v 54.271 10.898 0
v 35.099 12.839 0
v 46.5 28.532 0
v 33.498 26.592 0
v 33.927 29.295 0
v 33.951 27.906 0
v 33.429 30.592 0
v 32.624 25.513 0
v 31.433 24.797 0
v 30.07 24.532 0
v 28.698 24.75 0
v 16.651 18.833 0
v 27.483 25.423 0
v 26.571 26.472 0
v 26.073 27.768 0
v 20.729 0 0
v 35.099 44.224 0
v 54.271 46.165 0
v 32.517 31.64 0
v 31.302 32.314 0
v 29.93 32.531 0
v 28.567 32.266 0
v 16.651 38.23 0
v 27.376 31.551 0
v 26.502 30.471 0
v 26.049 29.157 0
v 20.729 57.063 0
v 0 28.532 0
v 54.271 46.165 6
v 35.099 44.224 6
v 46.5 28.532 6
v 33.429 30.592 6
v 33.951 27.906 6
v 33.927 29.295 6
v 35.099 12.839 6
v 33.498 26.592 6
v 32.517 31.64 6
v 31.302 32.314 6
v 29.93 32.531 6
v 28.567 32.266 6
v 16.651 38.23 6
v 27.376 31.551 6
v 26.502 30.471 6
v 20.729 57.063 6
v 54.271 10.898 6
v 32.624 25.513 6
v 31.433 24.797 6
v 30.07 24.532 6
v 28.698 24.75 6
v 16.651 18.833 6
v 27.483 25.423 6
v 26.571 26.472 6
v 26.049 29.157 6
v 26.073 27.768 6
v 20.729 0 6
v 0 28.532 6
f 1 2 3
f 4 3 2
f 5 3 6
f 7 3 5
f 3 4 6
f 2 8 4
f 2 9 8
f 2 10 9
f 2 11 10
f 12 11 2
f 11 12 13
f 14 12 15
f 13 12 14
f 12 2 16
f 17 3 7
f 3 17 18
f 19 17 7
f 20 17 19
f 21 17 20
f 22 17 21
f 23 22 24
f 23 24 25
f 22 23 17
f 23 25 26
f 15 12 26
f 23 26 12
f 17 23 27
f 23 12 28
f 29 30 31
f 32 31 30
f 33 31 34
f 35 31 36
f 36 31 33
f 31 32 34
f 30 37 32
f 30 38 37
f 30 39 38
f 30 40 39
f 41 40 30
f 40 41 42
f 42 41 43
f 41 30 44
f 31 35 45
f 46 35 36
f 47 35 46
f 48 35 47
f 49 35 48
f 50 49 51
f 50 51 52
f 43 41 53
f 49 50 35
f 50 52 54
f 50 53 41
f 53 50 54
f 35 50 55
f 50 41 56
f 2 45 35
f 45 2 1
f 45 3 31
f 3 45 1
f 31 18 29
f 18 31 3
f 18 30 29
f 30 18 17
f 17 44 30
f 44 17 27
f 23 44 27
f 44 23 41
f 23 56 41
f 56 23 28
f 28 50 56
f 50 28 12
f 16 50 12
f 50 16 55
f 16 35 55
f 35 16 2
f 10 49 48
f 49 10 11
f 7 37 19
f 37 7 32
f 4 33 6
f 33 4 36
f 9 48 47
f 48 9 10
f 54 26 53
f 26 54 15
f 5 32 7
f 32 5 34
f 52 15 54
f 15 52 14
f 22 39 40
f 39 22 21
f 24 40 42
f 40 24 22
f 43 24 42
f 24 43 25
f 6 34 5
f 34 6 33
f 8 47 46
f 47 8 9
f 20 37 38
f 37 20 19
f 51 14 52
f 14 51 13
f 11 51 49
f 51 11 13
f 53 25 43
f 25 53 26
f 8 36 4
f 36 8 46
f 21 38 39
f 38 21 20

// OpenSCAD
$fn = 32;

// ----------------------------------------------------------------------
// Star wheel: 5-point star, R30
// ----------------------------------------------------------------------

// --- parameters (mm) ---
n_points = 5;             // number of points / teeth
r_out = 30;               // tip radius
r_in = 16.5;              // root radius
bore_r = 4;               // centre bore radius
plate_t = 6;              // plate thickness, Z (extrusion height)
bore_d = 8;               // centre bore diameter

profile = [[0, 28.532], [16.651, 18.833], [20.729, 0], [35.099, 12.839], [54.271, 10.898], [46.5, 28.532], [54.271, 46.165], [35.099, 44.224], [20.729, 57.063], [16.651, 38.23]];  // primary outline, 10 points, counter clockwise
void_1 = [[33.927, 29.295], [33.429, 30.592], [32.517, 31.64], [31.302, 32.314], [29.93, 32.531], [28.567, 32.266], [27.376, 31.551], [26.502, 30.471], [26.049, 29.157], [26.073, 27.768], [26.571, 26.472], [27.483, 25.423], [28.698, 24.75], [30.07, 24.532], [31.433, 24.797], [32.624, 25.513], [33.498, 26.592], [33.951, 27.906]];  // centre bore, 18 points

// --- the one profile operation ---
difference() {
  linear_extrude(height = plate_t) polygon(points = profile);
  translate([0, 0, -1])
    linear_extrude(height = plate_t + 2) polygon(points = void_1);
}
